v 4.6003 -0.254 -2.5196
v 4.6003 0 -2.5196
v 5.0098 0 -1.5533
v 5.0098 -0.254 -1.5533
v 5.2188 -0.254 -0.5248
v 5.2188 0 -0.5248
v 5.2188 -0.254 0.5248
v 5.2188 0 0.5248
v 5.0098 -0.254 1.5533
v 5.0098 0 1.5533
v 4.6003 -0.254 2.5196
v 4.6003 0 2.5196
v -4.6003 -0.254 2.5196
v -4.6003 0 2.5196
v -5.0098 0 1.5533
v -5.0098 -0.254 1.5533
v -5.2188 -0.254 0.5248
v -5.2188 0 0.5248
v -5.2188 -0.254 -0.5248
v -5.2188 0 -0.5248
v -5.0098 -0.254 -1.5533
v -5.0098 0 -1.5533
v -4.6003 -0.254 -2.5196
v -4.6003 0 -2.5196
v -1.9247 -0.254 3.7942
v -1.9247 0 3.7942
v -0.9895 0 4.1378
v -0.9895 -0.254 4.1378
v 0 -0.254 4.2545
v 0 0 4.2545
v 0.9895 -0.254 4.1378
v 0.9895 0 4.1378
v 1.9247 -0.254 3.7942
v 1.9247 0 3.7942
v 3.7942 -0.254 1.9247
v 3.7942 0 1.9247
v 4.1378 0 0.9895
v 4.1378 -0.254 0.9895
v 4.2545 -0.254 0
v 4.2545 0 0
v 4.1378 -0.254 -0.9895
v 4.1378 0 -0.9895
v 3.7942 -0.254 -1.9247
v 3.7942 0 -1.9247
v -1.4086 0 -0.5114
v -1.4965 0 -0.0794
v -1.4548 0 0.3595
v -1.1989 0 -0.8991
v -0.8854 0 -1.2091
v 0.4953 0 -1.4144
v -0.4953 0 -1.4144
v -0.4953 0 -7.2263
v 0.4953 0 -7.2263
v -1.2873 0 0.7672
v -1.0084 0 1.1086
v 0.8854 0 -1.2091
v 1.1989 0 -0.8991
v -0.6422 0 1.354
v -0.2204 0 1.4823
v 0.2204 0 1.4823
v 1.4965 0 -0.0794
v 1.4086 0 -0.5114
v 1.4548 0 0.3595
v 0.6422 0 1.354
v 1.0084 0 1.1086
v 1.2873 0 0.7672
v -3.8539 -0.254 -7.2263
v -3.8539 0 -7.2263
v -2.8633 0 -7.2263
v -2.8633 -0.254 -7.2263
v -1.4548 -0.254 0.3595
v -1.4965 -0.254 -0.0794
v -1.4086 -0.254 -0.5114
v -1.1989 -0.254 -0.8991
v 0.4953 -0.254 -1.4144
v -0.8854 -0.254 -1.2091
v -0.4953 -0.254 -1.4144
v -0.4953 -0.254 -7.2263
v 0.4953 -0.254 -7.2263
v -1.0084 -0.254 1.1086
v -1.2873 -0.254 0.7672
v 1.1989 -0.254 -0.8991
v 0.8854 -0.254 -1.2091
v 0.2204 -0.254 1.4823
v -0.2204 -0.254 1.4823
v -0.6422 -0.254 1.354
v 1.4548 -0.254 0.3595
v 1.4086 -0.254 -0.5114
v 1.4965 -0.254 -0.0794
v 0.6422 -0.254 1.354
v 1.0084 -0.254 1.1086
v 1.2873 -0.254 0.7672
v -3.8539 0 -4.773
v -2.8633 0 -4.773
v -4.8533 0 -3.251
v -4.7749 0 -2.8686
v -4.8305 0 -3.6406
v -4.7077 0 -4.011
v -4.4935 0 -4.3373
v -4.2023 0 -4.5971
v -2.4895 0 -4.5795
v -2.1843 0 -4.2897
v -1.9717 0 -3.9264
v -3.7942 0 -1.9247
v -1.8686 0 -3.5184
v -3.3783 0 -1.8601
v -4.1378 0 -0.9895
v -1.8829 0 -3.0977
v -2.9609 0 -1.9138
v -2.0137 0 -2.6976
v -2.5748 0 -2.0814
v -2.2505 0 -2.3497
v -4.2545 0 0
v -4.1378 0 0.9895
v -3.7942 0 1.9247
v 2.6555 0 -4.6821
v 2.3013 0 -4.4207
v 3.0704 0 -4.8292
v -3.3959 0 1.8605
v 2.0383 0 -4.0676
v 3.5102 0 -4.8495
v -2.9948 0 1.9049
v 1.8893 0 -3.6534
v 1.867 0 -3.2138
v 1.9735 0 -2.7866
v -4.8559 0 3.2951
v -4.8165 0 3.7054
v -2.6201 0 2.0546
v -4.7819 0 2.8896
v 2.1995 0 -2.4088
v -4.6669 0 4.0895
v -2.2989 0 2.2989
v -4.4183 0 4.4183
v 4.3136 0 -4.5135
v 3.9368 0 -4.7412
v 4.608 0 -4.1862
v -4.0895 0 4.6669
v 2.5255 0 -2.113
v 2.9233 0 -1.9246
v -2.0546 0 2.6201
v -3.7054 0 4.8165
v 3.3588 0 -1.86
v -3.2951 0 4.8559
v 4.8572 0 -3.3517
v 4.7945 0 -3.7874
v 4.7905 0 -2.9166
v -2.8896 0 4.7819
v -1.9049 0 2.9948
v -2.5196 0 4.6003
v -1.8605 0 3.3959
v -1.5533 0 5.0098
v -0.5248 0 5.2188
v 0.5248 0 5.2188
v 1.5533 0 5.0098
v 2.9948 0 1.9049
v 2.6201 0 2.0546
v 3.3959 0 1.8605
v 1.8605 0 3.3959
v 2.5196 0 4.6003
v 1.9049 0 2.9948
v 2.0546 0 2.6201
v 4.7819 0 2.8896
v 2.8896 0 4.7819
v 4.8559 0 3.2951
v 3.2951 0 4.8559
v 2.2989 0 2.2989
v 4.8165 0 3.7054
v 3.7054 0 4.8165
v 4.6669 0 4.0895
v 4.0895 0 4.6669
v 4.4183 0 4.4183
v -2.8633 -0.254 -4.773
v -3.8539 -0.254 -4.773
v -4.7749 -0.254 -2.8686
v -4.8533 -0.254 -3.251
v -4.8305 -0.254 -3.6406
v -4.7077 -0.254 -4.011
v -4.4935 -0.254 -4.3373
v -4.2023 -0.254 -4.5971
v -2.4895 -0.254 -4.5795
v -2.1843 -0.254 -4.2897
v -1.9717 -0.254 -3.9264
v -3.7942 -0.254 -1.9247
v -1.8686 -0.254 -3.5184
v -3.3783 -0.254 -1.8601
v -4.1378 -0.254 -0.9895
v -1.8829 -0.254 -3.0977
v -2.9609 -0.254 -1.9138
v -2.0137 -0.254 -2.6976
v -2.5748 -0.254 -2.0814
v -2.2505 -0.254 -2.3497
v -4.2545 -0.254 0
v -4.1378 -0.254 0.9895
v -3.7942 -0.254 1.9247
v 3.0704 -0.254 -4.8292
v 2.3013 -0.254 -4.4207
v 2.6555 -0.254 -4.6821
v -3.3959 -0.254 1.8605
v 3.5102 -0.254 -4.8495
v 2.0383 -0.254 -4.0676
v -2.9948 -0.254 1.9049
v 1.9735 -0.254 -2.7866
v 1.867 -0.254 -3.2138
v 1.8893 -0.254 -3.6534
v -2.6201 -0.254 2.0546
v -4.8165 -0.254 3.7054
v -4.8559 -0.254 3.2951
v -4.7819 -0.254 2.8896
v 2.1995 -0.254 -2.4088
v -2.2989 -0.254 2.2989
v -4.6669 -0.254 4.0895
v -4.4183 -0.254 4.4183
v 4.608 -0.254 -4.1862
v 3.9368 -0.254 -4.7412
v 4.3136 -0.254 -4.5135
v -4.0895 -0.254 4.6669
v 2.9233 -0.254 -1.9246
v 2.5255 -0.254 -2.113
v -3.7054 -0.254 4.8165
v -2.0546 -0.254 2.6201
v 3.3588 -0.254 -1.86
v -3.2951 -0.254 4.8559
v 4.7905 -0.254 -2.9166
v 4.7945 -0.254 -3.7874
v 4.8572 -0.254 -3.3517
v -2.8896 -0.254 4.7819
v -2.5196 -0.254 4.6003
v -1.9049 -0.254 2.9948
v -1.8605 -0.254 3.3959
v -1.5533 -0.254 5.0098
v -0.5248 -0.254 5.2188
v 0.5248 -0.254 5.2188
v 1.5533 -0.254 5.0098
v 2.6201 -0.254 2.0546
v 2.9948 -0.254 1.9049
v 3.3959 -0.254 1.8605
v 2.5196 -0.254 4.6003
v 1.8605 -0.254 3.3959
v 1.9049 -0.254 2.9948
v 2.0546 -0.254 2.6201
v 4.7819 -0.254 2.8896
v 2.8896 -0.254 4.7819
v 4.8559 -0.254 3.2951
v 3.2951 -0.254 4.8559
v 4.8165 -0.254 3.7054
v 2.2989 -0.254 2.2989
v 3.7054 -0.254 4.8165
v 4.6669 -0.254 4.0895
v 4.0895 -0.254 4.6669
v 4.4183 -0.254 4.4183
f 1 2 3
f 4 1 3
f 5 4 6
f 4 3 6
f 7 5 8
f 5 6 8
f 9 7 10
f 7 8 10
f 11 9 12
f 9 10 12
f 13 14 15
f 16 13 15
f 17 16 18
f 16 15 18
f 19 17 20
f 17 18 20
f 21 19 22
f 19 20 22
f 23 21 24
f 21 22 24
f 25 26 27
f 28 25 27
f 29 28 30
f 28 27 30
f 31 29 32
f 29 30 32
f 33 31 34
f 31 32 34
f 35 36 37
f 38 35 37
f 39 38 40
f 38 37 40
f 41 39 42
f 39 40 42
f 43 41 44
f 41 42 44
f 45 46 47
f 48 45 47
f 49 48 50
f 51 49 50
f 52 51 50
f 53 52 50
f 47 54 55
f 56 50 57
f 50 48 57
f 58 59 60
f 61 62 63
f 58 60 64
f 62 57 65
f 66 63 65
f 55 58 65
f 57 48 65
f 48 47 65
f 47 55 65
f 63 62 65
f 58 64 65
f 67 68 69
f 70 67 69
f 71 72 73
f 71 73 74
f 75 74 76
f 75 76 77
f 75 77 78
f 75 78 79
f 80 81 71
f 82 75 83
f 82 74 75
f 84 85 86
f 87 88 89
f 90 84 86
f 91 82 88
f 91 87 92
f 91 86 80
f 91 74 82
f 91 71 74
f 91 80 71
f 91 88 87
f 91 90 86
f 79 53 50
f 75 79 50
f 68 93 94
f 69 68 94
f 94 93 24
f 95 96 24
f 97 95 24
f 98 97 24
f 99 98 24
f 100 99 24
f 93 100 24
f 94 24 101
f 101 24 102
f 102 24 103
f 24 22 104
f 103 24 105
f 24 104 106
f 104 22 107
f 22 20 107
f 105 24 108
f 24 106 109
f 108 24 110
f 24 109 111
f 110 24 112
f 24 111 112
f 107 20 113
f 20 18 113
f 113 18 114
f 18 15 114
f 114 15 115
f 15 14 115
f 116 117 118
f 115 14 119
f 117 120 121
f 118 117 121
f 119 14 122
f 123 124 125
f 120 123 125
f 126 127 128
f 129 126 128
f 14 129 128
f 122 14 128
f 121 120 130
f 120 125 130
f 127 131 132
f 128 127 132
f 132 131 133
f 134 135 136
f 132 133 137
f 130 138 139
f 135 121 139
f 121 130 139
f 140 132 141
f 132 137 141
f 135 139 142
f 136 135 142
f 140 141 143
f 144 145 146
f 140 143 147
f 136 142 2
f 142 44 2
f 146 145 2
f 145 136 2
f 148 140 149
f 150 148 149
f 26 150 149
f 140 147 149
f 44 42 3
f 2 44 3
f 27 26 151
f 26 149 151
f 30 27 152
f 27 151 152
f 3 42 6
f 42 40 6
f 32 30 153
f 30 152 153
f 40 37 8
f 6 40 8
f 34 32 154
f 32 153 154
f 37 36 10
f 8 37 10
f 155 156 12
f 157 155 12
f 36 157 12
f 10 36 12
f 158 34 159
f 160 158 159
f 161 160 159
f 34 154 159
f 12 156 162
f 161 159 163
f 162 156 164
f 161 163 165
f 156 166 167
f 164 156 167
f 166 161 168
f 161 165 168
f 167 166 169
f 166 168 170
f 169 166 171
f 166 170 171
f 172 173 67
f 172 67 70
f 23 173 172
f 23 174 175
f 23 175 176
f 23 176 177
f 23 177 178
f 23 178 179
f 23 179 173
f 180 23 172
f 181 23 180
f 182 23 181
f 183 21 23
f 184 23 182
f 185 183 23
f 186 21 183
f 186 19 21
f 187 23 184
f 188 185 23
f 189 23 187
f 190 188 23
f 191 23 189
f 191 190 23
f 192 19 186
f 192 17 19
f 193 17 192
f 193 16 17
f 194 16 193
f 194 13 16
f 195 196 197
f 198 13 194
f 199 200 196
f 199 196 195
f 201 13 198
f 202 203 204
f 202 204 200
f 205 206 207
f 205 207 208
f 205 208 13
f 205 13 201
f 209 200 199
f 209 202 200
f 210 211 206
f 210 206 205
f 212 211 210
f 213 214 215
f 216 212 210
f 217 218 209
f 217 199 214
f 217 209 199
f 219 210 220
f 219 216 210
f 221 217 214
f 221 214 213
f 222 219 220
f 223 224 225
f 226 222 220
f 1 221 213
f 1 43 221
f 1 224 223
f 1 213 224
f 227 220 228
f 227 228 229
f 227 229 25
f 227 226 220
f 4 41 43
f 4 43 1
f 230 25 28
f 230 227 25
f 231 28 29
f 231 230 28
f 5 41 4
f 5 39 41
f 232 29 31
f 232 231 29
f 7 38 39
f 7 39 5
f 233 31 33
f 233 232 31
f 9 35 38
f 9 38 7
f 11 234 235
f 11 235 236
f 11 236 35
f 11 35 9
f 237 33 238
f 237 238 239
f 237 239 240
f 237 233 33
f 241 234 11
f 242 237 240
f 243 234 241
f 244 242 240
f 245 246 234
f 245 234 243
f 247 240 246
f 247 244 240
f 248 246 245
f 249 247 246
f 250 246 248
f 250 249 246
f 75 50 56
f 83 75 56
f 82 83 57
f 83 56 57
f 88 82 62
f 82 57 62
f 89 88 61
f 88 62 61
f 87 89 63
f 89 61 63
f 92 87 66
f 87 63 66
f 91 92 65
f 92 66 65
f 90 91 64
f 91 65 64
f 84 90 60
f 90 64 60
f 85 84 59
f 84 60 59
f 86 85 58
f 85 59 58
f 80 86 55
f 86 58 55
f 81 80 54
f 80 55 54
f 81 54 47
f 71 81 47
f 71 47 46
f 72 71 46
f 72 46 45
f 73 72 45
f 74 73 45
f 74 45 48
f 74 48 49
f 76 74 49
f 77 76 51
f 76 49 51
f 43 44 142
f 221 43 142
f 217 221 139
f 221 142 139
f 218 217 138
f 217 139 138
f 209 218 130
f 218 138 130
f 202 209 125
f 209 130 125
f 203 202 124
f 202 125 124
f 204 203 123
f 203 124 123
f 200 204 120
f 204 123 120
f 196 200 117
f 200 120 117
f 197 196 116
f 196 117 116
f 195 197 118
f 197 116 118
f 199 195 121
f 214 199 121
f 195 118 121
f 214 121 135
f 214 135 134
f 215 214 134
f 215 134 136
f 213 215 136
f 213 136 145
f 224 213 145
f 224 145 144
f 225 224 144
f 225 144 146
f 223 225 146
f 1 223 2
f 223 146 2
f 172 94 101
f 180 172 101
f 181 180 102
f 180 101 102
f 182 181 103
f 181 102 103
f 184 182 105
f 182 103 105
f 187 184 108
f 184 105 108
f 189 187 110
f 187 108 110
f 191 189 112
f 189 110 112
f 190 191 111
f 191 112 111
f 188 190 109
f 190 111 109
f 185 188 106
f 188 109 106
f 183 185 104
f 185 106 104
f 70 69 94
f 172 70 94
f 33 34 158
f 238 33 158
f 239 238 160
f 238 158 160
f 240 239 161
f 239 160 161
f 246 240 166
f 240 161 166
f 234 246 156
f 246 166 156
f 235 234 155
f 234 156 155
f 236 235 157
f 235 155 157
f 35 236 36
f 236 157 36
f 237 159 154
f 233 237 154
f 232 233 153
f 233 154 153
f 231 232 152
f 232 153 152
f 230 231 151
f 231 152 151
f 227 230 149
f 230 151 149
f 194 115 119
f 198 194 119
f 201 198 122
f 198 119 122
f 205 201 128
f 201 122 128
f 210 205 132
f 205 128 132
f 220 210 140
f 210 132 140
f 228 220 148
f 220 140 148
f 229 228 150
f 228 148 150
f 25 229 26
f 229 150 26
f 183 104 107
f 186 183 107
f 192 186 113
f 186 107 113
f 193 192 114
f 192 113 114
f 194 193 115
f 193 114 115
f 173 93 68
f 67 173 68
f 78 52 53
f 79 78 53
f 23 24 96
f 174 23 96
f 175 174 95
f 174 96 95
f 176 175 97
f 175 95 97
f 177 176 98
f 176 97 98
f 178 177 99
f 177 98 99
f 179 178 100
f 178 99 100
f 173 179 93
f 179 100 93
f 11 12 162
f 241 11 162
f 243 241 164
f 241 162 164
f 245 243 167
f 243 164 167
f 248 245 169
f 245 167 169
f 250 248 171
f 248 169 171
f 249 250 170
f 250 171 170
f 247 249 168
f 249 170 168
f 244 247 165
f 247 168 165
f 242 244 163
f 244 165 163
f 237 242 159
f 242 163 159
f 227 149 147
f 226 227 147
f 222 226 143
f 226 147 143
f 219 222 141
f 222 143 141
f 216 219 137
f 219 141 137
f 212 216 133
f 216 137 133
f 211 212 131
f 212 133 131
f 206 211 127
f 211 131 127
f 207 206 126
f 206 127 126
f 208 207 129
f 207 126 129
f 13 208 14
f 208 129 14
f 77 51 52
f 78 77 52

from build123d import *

# Parameters (mm, degrees)
F1_DEPTH = 0.254


with BuildPart() as f1:
    # F0 (on Front) → F1 (new body)
    with BuildSketch(Plane.XZ):
        with BuildLine():
            ThreePointArc((-3.794232, -1.924726), (-4.2545, 0), (-3.794232, 1.924726))
            ThreePointArc((-3.794232, 1.924726), (-2.298946, 2.298946), (-1.924726, 3.794232))
            ThreePointArc((-1.924726, 3.794232), (0, 4.2545), (1.924726, 3.794232))
            ThreePointArc((1.924726, 3.794232), (2.298946, 2.298946), (3.794232, 1.924726))
            ThreePointArc((3.794232, 1.924726), (4.2545, 0), (3.794232, -1.924726))
            ThreePointArc((3.794232, -1.924726), (2.468783, -4.564435), (4.600309, -2.519569))
            ThreePointArc((4.600309, -2.519569), (5.2451, 0), (4.600309, 2.519569))
            ThreePointArc((4.600309, 2.519569), (4.418286, 4.418286), (2.519569, 4.600309))
            ThreePointArc((2.519569, 4.600309), (0, 5.2451), (-2.519569, 4.600309))
            ThreePointArc((-2.519569, 4.600309), (-4.418286, 4.418286), (-4.600309, 2.519569))
            ThreePointArc((-4.600309, 2.519569), (-5.2451, 0), (-4.600309, -2.519569))
            ThreePointArc((-4.600309, -2.519569), (-4.78121, -3.829815), (-3.853916, -4.772999))
            Line((-3.853916, -4.772999), (-3.853916, -7.2263))
            Line((-3.853916, -7.2263), (-2.863316, -7.2263))
            Line((-2.863316, -7.2263), (-2.863316, -4.772999))
            ThreePointArc((-2.863316, -4.772999), (-1.934167, -2.893055), (-3.794232, -1.924726))
        make_face()
        with BuildLine():
            Line((0.4953, -7.2263), (0.4953, -1.414383))
            ThreePointArc((0.4953, -1.414383), (0, 1.4986), (-0.4953, -1.414383))
            Line((-0.4953, -1.414383), (-0.4953, -7.2263))
            Line((-0.4953, -7.2263), (0.4953, -7.2263))
        make_face()
    extrude(amount=F1_DEPTH)


solid = f1.part
